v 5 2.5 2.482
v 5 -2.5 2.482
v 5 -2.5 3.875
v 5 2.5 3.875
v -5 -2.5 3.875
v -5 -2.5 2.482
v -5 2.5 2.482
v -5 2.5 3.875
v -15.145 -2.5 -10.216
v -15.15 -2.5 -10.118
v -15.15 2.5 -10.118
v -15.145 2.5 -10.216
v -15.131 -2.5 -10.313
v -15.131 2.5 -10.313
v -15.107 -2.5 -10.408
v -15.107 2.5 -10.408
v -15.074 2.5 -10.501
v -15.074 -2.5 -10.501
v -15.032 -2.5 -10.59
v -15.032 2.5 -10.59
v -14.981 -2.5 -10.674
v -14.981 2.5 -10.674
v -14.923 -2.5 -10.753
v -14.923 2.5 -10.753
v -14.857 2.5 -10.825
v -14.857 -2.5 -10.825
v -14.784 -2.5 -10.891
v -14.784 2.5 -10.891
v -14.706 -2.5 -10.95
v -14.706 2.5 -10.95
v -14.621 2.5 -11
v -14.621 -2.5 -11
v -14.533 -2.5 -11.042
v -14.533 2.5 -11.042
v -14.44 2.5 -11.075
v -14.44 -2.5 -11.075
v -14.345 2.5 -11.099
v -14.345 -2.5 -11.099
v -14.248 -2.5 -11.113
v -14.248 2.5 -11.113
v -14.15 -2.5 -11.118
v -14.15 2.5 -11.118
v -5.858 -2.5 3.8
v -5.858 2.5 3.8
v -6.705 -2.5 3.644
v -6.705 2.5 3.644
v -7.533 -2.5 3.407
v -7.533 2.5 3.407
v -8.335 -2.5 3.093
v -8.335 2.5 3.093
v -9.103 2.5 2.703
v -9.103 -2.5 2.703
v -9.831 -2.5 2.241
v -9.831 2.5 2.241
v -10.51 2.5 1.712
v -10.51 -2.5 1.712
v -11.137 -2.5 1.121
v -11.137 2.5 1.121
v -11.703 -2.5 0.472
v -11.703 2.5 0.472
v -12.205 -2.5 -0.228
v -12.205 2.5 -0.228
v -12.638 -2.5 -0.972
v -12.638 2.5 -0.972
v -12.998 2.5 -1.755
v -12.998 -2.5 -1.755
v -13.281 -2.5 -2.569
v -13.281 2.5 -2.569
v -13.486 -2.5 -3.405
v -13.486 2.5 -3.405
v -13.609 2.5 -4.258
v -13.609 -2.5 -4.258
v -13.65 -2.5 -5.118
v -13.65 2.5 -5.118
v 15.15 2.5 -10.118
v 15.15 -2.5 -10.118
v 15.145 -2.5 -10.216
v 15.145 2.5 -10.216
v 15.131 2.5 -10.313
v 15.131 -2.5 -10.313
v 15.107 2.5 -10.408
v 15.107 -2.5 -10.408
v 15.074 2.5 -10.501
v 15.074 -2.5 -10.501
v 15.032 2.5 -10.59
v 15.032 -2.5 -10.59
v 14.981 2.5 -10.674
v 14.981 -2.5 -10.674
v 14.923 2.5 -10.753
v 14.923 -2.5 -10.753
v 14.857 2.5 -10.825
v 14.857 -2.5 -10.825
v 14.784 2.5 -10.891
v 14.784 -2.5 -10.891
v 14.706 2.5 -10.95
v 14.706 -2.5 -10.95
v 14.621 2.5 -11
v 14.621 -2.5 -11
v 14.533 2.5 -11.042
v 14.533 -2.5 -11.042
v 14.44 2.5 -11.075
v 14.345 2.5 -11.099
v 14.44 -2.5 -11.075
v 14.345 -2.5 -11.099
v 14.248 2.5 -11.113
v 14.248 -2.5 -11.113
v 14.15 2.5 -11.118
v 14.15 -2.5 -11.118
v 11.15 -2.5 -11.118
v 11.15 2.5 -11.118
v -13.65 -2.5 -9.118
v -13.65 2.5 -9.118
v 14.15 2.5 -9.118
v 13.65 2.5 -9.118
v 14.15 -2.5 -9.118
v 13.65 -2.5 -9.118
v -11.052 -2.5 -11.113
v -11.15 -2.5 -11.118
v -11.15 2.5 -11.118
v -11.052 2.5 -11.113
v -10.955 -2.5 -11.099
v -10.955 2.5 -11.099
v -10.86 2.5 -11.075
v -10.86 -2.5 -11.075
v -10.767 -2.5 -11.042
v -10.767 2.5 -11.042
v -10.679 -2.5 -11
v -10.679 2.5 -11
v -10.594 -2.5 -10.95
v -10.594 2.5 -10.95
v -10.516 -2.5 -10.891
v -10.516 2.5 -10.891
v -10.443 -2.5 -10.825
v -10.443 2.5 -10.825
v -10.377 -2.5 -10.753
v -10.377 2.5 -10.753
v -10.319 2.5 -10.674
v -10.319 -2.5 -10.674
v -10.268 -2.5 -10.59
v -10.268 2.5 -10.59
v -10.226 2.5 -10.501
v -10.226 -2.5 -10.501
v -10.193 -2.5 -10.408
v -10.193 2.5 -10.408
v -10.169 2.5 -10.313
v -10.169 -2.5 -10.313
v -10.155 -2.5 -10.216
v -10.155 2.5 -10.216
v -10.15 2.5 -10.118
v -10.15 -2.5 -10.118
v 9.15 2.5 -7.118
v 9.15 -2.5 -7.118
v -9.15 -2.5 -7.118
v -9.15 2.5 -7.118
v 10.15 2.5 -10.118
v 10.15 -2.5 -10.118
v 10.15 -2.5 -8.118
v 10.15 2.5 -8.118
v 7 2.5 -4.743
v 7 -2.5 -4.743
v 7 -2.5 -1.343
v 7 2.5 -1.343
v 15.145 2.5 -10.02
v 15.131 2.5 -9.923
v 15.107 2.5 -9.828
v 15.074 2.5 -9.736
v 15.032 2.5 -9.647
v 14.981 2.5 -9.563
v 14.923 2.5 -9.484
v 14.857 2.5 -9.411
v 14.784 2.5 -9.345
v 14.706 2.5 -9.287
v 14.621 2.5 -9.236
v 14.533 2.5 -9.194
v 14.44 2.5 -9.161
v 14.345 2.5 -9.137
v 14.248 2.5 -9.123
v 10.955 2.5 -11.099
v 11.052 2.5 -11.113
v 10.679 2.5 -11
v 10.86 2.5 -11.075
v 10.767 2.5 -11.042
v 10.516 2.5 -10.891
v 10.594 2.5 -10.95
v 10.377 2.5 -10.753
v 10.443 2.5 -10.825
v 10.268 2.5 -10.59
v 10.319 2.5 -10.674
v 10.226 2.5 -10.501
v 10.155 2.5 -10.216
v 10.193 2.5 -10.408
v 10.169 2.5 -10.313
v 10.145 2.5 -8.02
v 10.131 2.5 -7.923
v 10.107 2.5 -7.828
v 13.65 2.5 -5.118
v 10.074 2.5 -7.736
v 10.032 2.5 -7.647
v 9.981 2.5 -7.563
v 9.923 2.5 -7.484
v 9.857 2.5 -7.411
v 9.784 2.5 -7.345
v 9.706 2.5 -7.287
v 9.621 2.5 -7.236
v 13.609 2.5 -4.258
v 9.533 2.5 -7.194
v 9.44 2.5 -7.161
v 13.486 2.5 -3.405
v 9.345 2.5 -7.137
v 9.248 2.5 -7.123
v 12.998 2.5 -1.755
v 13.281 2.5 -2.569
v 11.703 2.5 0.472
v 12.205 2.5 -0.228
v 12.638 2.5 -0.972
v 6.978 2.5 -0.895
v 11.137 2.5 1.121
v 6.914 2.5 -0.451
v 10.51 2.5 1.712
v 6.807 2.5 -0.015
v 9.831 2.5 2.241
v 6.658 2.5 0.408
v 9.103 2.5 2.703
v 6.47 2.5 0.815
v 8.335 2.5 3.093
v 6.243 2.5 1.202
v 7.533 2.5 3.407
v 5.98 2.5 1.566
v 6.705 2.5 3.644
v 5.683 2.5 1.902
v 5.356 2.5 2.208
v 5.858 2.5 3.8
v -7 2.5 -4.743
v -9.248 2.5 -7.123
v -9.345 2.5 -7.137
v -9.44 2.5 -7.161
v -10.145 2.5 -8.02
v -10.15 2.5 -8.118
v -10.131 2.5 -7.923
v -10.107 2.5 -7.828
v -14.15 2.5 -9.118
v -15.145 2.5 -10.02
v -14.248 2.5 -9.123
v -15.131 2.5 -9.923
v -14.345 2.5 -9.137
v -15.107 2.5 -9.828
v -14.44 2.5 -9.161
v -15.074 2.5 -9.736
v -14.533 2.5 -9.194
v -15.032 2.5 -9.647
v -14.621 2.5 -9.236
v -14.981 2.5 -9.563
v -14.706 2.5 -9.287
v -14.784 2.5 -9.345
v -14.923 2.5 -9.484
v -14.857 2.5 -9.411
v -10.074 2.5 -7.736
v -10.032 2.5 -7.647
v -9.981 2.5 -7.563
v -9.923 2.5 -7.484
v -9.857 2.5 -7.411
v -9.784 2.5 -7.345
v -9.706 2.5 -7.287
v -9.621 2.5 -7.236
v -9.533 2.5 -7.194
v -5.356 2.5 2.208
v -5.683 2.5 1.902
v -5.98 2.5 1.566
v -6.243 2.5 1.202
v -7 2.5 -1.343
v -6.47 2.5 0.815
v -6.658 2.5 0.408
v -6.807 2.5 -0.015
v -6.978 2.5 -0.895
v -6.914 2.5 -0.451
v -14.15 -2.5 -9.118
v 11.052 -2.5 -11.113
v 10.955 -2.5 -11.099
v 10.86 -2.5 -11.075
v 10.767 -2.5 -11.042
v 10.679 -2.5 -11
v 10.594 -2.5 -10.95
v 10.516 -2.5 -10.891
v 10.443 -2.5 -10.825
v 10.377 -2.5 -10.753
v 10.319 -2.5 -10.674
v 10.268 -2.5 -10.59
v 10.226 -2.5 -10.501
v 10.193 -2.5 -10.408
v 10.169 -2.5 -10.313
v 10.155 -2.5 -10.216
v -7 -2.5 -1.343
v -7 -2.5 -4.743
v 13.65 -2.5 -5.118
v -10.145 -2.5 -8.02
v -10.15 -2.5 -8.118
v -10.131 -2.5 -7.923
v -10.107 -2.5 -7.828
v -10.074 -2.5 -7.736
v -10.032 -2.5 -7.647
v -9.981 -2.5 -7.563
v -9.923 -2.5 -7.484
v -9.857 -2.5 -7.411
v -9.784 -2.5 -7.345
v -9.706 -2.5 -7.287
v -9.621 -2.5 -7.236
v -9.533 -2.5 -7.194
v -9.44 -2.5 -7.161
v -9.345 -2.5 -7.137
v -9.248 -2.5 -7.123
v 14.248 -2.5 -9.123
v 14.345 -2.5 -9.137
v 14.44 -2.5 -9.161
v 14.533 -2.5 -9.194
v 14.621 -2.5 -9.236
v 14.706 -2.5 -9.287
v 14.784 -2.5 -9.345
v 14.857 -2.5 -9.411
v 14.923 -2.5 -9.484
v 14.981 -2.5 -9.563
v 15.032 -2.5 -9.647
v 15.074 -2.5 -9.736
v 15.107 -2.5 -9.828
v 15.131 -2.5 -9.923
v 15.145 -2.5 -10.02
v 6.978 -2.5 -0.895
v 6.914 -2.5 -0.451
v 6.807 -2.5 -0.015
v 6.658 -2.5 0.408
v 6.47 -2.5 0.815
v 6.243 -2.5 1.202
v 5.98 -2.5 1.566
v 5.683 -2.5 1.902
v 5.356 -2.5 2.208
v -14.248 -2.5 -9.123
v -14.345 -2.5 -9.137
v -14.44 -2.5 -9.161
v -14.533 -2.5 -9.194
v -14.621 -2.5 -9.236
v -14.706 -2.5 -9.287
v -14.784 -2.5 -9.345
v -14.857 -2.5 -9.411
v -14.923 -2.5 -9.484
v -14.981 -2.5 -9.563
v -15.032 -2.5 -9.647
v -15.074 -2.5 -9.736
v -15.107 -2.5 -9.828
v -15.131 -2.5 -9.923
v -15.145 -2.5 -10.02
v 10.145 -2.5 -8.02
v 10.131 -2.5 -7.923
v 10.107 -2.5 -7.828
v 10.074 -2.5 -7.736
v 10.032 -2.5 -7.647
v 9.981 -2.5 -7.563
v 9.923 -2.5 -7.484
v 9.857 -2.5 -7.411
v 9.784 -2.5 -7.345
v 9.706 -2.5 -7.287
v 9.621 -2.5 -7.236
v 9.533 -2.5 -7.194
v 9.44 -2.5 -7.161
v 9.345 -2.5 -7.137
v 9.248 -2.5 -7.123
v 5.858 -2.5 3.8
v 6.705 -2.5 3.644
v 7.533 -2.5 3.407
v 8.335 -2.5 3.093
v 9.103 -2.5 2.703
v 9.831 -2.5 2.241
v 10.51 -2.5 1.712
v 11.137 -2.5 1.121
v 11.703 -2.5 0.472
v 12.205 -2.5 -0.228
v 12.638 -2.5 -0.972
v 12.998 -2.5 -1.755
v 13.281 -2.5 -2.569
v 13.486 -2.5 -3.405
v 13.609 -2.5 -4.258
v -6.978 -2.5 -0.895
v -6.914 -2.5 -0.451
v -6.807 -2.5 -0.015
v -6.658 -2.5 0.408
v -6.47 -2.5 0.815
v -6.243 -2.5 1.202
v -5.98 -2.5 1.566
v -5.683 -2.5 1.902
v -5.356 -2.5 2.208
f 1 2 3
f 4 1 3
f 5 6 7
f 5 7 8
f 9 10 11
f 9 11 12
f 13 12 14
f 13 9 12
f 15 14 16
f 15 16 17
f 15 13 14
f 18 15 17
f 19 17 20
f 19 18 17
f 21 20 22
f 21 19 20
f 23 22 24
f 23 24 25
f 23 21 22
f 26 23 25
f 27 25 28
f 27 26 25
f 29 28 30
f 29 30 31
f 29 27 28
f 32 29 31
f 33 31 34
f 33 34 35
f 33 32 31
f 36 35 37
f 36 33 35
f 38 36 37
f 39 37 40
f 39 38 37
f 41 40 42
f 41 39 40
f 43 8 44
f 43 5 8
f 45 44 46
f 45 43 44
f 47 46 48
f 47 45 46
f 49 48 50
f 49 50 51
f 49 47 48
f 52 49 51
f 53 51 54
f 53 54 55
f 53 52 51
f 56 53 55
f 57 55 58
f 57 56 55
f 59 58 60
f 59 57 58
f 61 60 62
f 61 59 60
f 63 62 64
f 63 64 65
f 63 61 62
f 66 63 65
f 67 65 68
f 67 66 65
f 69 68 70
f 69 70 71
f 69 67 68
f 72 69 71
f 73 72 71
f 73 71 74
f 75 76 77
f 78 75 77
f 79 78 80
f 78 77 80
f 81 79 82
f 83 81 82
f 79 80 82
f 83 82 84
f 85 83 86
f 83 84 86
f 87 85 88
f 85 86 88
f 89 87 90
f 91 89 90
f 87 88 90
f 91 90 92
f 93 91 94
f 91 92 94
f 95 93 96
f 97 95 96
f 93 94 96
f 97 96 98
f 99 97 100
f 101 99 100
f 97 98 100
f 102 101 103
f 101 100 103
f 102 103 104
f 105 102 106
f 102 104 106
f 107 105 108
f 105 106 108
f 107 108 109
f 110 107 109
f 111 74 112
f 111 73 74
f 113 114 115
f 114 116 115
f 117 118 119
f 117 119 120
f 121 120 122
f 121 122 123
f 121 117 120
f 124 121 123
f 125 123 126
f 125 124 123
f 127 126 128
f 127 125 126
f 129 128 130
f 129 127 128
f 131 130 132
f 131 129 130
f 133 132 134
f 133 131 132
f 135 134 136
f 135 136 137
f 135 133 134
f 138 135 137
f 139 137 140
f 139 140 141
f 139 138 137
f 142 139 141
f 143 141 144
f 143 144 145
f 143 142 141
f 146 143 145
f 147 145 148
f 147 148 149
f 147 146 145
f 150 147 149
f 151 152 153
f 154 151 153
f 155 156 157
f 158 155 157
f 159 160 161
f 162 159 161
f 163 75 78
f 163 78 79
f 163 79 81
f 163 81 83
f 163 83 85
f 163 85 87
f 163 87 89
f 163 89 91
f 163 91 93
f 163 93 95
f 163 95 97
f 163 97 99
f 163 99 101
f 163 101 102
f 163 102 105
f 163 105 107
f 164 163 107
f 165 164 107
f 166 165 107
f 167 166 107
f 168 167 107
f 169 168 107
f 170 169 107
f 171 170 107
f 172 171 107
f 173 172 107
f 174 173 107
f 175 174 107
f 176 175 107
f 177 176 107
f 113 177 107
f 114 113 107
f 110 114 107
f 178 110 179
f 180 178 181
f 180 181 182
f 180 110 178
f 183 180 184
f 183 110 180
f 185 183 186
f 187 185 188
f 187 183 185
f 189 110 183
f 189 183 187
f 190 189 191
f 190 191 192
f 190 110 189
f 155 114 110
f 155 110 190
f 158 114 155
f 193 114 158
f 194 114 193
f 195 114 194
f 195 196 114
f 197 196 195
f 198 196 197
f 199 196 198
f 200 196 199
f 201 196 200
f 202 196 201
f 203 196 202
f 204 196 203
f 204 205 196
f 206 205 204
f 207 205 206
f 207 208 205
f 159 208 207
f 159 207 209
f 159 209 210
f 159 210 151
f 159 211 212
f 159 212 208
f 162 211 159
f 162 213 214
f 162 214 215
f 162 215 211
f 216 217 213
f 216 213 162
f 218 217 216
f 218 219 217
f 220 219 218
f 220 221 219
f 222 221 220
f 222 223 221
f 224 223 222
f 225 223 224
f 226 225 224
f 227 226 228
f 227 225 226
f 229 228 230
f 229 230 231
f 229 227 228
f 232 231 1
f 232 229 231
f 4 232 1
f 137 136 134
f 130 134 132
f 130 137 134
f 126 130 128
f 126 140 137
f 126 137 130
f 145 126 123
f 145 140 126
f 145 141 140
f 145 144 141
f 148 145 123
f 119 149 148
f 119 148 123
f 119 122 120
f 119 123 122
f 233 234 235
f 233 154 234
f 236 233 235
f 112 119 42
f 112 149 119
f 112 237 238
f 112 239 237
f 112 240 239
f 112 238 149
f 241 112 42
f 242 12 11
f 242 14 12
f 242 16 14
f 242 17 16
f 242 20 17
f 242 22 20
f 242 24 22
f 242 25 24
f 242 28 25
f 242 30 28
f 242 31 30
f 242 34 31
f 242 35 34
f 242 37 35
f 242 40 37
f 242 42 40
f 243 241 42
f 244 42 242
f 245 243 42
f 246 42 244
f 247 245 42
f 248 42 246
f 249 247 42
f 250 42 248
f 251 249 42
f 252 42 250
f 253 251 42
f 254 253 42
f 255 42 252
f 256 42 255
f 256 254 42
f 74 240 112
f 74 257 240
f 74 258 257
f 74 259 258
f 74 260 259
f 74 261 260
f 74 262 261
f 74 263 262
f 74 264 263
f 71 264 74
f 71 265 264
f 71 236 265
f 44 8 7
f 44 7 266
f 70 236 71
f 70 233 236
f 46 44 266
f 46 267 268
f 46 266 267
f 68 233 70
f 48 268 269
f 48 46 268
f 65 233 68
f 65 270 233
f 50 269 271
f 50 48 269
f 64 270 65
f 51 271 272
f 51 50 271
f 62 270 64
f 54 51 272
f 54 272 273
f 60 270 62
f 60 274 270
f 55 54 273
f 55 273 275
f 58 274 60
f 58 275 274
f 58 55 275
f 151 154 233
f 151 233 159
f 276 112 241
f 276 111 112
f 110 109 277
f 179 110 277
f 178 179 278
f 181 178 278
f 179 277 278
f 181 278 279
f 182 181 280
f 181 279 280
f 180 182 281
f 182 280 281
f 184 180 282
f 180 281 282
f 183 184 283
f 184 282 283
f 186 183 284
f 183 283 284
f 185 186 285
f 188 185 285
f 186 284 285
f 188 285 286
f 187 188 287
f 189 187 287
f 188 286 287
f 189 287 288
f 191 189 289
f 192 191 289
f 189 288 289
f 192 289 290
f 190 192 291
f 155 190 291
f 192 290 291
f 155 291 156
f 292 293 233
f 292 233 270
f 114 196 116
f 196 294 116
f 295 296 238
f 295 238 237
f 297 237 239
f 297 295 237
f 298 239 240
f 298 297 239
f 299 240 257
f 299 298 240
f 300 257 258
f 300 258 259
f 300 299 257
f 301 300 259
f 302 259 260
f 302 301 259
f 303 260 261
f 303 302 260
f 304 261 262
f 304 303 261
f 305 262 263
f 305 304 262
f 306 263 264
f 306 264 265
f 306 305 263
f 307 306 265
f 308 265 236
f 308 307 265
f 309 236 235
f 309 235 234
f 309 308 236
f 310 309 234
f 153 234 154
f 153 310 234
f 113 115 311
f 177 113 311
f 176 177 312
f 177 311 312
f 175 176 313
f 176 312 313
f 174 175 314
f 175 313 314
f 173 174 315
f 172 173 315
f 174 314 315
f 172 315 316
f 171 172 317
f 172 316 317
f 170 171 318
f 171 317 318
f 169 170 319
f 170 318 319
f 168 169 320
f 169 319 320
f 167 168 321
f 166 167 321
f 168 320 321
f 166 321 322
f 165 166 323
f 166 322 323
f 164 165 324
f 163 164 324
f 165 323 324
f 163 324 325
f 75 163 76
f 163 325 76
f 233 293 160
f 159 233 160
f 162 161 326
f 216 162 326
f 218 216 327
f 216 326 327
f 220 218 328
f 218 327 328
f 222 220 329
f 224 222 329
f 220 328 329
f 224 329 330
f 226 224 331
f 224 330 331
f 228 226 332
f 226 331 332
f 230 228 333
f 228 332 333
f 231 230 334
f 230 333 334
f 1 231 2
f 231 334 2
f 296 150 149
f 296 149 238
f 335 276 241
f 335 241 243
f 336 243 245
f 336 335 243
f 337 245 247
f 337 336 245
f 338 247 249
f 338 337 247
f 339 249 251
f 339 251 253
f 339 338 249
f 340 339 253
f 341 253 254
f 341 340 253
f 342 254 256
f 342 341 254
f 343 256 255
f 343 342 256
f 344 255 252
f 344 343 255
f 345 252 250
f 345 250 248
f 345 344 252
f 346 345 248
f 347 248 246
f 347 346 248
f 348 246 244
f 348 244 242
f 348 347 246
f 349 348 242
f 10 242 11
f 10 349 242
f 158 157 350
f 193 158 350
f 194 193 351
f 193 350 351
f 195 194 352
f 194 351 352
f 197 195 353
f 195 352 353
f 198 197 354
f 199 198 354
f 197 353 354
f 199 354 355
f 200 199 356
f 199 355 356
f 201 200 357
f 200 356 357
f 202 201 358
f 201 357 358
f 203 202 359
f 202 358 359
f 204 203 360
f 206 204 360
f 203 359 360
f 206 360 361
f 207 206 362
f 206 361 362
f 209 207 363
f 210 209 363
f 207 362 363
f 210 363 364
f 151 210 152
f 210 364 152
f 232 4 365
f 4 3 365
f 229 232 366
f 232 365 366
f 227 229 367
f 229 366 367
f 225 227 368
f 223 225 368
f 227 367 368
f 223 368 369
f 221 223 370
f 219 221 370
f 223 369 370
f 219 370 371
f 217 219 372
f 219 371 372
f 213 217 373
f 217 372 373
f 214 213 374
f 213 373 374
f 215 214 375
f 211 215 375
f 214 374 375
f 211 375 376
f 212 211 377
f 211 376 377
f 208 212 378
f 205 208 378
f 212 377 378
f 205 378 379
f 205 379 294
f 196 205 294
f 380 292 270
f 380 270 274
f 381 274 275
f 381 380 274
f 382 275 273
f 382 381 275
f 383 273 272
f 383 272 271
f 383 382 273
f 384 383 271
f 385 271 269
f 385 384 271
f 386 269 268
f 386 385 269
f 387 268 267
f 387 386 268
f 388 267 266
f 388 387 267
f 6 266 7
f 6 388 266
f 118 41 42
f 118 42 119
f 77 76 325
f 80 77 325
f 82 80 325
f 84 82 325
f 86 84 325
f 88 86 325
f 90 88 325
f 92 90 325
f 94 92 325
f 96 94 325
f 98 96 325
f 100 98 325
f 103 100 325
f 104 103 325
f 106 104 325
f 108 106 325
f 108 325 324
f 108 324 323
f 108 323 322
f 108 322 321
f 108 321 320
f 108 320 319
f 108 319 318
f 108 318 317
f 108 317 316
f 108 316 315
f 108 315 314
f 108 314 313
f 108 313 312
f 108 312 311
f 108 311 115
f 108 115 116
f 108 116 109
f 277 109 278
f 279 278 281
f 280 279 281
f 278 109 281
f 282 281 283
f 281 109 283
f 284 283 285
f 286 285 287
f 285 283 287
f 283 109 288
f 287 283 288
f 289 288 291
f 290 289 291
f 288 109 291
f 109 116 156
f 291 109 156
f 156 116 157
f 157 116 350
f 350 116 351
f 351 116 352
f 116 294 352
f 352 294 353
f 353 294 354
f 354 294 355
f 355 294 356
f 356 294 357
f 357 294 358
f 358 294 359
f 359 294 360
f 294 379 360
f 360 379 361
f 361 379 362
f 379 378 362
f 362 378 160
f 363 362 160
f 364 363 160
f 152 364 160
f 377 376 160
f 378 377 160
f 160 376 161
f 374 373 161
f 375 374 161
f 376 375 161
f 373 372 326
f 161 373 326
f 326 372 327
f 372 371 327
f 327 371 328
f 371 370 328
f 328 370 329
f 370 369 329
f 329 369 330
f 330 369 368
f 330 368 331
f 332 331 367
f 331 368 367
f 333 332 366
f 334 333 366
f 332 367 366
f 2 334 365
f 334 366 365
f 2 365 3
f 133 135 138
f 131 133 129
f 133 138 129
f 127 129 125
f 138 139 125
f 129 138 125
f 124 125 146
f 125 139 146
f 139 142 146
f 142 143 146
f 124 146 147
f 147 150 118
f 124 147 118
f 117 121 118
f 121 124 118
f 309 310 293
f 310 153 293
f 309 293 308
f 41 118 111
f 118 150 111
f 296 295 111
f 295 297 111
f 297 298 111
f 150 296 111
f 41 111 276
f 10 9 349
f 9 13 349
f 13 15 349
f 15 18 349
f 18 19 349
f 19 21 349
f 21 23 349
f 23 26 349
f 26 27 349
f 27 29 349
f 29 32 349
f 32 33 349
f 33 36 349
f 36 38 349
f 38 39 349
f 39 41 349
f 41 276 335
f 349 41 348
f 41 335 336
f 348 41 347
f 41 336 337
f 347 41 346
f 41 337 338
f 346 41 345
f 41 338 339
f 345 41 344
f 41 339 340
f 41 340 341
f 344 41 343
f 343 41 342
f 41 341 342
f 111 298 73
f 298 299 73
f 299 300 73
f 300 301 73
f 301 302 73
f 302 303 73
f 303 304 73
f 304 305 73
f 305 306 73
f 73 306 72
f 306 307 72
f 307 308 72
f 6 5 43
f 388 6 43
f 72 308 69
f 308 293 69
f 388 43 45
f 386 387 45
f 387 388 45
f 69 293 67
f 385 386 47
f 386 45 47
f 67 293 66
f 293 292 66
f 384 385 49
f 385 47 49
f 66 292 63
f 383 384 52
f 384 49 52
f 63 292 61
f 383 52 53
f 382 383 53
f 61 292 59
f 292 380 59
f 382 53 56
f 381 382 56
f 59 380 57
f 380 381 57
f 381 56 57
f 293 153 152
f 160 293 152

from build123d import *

# Parameters (mm, degrees)
F2_DEPTH = 2.5


with BuildPart() as f2:
    # F1 (on Front) → F2 (new body, symmetric)
    with BuildSketch(Plane.XZ):
        with BuildLine():
            Line((-13.65, -9.118186), (-14.15, -9.118186))
            ThreePointArc((-14.15, -9.118186), (-14.857107, -9.41108), (-15.15, -10.118186))
            ThreePointArc((-15.15, -10.118186), (-14.857107, -10.825293), (-14.15, -11.118186))
            Line((-14.15, -11.118186), (-11.15, -11.118186))
            ThreePointArc((-11.15, -11.118186), (-10.442893, -10.825293), (-10.15, -10.118186))
            Line((-10.15, -10.118186), (-10.15, -8.118186))
            ThreePointArc((-10.15, -8.118186), (-9.857107, -7.41108), (-9.15, -7.118186))
            Line((-9.15, -7.118186), (0, -7.118186))
            Line((0, -7.118186), (0, -4.742948))
            Line((0, -4.742948), (-7, -4.742948))
            Line((-7, -4.742948), (-7, -1.342948))
            ThreePointArc((-7, -1.342948), (-6.469822, 0.815107), (-5, 2.481814))
            Line((-5, 2.481814), (-5, 3.875005))
            ThreePointArc((-5, 3.875005), (-11.136524, 1.120804), (-13.65, -5.118186))
            Line((-13.65, -5.118186), (-13.65, -9.118186))
        make_face()
    extrude(amount=F2_DEPTH, both=True)

    # F3: F2 across face


with BuildPart() as f2_1:
    add(f2.part)
    add(f2.part.mirror(Plane(origin=(0, 0, -5.930567), x_dir=(0, 1, 0), z_dir=(1, 0, 0))))


solid = f2_1.part
